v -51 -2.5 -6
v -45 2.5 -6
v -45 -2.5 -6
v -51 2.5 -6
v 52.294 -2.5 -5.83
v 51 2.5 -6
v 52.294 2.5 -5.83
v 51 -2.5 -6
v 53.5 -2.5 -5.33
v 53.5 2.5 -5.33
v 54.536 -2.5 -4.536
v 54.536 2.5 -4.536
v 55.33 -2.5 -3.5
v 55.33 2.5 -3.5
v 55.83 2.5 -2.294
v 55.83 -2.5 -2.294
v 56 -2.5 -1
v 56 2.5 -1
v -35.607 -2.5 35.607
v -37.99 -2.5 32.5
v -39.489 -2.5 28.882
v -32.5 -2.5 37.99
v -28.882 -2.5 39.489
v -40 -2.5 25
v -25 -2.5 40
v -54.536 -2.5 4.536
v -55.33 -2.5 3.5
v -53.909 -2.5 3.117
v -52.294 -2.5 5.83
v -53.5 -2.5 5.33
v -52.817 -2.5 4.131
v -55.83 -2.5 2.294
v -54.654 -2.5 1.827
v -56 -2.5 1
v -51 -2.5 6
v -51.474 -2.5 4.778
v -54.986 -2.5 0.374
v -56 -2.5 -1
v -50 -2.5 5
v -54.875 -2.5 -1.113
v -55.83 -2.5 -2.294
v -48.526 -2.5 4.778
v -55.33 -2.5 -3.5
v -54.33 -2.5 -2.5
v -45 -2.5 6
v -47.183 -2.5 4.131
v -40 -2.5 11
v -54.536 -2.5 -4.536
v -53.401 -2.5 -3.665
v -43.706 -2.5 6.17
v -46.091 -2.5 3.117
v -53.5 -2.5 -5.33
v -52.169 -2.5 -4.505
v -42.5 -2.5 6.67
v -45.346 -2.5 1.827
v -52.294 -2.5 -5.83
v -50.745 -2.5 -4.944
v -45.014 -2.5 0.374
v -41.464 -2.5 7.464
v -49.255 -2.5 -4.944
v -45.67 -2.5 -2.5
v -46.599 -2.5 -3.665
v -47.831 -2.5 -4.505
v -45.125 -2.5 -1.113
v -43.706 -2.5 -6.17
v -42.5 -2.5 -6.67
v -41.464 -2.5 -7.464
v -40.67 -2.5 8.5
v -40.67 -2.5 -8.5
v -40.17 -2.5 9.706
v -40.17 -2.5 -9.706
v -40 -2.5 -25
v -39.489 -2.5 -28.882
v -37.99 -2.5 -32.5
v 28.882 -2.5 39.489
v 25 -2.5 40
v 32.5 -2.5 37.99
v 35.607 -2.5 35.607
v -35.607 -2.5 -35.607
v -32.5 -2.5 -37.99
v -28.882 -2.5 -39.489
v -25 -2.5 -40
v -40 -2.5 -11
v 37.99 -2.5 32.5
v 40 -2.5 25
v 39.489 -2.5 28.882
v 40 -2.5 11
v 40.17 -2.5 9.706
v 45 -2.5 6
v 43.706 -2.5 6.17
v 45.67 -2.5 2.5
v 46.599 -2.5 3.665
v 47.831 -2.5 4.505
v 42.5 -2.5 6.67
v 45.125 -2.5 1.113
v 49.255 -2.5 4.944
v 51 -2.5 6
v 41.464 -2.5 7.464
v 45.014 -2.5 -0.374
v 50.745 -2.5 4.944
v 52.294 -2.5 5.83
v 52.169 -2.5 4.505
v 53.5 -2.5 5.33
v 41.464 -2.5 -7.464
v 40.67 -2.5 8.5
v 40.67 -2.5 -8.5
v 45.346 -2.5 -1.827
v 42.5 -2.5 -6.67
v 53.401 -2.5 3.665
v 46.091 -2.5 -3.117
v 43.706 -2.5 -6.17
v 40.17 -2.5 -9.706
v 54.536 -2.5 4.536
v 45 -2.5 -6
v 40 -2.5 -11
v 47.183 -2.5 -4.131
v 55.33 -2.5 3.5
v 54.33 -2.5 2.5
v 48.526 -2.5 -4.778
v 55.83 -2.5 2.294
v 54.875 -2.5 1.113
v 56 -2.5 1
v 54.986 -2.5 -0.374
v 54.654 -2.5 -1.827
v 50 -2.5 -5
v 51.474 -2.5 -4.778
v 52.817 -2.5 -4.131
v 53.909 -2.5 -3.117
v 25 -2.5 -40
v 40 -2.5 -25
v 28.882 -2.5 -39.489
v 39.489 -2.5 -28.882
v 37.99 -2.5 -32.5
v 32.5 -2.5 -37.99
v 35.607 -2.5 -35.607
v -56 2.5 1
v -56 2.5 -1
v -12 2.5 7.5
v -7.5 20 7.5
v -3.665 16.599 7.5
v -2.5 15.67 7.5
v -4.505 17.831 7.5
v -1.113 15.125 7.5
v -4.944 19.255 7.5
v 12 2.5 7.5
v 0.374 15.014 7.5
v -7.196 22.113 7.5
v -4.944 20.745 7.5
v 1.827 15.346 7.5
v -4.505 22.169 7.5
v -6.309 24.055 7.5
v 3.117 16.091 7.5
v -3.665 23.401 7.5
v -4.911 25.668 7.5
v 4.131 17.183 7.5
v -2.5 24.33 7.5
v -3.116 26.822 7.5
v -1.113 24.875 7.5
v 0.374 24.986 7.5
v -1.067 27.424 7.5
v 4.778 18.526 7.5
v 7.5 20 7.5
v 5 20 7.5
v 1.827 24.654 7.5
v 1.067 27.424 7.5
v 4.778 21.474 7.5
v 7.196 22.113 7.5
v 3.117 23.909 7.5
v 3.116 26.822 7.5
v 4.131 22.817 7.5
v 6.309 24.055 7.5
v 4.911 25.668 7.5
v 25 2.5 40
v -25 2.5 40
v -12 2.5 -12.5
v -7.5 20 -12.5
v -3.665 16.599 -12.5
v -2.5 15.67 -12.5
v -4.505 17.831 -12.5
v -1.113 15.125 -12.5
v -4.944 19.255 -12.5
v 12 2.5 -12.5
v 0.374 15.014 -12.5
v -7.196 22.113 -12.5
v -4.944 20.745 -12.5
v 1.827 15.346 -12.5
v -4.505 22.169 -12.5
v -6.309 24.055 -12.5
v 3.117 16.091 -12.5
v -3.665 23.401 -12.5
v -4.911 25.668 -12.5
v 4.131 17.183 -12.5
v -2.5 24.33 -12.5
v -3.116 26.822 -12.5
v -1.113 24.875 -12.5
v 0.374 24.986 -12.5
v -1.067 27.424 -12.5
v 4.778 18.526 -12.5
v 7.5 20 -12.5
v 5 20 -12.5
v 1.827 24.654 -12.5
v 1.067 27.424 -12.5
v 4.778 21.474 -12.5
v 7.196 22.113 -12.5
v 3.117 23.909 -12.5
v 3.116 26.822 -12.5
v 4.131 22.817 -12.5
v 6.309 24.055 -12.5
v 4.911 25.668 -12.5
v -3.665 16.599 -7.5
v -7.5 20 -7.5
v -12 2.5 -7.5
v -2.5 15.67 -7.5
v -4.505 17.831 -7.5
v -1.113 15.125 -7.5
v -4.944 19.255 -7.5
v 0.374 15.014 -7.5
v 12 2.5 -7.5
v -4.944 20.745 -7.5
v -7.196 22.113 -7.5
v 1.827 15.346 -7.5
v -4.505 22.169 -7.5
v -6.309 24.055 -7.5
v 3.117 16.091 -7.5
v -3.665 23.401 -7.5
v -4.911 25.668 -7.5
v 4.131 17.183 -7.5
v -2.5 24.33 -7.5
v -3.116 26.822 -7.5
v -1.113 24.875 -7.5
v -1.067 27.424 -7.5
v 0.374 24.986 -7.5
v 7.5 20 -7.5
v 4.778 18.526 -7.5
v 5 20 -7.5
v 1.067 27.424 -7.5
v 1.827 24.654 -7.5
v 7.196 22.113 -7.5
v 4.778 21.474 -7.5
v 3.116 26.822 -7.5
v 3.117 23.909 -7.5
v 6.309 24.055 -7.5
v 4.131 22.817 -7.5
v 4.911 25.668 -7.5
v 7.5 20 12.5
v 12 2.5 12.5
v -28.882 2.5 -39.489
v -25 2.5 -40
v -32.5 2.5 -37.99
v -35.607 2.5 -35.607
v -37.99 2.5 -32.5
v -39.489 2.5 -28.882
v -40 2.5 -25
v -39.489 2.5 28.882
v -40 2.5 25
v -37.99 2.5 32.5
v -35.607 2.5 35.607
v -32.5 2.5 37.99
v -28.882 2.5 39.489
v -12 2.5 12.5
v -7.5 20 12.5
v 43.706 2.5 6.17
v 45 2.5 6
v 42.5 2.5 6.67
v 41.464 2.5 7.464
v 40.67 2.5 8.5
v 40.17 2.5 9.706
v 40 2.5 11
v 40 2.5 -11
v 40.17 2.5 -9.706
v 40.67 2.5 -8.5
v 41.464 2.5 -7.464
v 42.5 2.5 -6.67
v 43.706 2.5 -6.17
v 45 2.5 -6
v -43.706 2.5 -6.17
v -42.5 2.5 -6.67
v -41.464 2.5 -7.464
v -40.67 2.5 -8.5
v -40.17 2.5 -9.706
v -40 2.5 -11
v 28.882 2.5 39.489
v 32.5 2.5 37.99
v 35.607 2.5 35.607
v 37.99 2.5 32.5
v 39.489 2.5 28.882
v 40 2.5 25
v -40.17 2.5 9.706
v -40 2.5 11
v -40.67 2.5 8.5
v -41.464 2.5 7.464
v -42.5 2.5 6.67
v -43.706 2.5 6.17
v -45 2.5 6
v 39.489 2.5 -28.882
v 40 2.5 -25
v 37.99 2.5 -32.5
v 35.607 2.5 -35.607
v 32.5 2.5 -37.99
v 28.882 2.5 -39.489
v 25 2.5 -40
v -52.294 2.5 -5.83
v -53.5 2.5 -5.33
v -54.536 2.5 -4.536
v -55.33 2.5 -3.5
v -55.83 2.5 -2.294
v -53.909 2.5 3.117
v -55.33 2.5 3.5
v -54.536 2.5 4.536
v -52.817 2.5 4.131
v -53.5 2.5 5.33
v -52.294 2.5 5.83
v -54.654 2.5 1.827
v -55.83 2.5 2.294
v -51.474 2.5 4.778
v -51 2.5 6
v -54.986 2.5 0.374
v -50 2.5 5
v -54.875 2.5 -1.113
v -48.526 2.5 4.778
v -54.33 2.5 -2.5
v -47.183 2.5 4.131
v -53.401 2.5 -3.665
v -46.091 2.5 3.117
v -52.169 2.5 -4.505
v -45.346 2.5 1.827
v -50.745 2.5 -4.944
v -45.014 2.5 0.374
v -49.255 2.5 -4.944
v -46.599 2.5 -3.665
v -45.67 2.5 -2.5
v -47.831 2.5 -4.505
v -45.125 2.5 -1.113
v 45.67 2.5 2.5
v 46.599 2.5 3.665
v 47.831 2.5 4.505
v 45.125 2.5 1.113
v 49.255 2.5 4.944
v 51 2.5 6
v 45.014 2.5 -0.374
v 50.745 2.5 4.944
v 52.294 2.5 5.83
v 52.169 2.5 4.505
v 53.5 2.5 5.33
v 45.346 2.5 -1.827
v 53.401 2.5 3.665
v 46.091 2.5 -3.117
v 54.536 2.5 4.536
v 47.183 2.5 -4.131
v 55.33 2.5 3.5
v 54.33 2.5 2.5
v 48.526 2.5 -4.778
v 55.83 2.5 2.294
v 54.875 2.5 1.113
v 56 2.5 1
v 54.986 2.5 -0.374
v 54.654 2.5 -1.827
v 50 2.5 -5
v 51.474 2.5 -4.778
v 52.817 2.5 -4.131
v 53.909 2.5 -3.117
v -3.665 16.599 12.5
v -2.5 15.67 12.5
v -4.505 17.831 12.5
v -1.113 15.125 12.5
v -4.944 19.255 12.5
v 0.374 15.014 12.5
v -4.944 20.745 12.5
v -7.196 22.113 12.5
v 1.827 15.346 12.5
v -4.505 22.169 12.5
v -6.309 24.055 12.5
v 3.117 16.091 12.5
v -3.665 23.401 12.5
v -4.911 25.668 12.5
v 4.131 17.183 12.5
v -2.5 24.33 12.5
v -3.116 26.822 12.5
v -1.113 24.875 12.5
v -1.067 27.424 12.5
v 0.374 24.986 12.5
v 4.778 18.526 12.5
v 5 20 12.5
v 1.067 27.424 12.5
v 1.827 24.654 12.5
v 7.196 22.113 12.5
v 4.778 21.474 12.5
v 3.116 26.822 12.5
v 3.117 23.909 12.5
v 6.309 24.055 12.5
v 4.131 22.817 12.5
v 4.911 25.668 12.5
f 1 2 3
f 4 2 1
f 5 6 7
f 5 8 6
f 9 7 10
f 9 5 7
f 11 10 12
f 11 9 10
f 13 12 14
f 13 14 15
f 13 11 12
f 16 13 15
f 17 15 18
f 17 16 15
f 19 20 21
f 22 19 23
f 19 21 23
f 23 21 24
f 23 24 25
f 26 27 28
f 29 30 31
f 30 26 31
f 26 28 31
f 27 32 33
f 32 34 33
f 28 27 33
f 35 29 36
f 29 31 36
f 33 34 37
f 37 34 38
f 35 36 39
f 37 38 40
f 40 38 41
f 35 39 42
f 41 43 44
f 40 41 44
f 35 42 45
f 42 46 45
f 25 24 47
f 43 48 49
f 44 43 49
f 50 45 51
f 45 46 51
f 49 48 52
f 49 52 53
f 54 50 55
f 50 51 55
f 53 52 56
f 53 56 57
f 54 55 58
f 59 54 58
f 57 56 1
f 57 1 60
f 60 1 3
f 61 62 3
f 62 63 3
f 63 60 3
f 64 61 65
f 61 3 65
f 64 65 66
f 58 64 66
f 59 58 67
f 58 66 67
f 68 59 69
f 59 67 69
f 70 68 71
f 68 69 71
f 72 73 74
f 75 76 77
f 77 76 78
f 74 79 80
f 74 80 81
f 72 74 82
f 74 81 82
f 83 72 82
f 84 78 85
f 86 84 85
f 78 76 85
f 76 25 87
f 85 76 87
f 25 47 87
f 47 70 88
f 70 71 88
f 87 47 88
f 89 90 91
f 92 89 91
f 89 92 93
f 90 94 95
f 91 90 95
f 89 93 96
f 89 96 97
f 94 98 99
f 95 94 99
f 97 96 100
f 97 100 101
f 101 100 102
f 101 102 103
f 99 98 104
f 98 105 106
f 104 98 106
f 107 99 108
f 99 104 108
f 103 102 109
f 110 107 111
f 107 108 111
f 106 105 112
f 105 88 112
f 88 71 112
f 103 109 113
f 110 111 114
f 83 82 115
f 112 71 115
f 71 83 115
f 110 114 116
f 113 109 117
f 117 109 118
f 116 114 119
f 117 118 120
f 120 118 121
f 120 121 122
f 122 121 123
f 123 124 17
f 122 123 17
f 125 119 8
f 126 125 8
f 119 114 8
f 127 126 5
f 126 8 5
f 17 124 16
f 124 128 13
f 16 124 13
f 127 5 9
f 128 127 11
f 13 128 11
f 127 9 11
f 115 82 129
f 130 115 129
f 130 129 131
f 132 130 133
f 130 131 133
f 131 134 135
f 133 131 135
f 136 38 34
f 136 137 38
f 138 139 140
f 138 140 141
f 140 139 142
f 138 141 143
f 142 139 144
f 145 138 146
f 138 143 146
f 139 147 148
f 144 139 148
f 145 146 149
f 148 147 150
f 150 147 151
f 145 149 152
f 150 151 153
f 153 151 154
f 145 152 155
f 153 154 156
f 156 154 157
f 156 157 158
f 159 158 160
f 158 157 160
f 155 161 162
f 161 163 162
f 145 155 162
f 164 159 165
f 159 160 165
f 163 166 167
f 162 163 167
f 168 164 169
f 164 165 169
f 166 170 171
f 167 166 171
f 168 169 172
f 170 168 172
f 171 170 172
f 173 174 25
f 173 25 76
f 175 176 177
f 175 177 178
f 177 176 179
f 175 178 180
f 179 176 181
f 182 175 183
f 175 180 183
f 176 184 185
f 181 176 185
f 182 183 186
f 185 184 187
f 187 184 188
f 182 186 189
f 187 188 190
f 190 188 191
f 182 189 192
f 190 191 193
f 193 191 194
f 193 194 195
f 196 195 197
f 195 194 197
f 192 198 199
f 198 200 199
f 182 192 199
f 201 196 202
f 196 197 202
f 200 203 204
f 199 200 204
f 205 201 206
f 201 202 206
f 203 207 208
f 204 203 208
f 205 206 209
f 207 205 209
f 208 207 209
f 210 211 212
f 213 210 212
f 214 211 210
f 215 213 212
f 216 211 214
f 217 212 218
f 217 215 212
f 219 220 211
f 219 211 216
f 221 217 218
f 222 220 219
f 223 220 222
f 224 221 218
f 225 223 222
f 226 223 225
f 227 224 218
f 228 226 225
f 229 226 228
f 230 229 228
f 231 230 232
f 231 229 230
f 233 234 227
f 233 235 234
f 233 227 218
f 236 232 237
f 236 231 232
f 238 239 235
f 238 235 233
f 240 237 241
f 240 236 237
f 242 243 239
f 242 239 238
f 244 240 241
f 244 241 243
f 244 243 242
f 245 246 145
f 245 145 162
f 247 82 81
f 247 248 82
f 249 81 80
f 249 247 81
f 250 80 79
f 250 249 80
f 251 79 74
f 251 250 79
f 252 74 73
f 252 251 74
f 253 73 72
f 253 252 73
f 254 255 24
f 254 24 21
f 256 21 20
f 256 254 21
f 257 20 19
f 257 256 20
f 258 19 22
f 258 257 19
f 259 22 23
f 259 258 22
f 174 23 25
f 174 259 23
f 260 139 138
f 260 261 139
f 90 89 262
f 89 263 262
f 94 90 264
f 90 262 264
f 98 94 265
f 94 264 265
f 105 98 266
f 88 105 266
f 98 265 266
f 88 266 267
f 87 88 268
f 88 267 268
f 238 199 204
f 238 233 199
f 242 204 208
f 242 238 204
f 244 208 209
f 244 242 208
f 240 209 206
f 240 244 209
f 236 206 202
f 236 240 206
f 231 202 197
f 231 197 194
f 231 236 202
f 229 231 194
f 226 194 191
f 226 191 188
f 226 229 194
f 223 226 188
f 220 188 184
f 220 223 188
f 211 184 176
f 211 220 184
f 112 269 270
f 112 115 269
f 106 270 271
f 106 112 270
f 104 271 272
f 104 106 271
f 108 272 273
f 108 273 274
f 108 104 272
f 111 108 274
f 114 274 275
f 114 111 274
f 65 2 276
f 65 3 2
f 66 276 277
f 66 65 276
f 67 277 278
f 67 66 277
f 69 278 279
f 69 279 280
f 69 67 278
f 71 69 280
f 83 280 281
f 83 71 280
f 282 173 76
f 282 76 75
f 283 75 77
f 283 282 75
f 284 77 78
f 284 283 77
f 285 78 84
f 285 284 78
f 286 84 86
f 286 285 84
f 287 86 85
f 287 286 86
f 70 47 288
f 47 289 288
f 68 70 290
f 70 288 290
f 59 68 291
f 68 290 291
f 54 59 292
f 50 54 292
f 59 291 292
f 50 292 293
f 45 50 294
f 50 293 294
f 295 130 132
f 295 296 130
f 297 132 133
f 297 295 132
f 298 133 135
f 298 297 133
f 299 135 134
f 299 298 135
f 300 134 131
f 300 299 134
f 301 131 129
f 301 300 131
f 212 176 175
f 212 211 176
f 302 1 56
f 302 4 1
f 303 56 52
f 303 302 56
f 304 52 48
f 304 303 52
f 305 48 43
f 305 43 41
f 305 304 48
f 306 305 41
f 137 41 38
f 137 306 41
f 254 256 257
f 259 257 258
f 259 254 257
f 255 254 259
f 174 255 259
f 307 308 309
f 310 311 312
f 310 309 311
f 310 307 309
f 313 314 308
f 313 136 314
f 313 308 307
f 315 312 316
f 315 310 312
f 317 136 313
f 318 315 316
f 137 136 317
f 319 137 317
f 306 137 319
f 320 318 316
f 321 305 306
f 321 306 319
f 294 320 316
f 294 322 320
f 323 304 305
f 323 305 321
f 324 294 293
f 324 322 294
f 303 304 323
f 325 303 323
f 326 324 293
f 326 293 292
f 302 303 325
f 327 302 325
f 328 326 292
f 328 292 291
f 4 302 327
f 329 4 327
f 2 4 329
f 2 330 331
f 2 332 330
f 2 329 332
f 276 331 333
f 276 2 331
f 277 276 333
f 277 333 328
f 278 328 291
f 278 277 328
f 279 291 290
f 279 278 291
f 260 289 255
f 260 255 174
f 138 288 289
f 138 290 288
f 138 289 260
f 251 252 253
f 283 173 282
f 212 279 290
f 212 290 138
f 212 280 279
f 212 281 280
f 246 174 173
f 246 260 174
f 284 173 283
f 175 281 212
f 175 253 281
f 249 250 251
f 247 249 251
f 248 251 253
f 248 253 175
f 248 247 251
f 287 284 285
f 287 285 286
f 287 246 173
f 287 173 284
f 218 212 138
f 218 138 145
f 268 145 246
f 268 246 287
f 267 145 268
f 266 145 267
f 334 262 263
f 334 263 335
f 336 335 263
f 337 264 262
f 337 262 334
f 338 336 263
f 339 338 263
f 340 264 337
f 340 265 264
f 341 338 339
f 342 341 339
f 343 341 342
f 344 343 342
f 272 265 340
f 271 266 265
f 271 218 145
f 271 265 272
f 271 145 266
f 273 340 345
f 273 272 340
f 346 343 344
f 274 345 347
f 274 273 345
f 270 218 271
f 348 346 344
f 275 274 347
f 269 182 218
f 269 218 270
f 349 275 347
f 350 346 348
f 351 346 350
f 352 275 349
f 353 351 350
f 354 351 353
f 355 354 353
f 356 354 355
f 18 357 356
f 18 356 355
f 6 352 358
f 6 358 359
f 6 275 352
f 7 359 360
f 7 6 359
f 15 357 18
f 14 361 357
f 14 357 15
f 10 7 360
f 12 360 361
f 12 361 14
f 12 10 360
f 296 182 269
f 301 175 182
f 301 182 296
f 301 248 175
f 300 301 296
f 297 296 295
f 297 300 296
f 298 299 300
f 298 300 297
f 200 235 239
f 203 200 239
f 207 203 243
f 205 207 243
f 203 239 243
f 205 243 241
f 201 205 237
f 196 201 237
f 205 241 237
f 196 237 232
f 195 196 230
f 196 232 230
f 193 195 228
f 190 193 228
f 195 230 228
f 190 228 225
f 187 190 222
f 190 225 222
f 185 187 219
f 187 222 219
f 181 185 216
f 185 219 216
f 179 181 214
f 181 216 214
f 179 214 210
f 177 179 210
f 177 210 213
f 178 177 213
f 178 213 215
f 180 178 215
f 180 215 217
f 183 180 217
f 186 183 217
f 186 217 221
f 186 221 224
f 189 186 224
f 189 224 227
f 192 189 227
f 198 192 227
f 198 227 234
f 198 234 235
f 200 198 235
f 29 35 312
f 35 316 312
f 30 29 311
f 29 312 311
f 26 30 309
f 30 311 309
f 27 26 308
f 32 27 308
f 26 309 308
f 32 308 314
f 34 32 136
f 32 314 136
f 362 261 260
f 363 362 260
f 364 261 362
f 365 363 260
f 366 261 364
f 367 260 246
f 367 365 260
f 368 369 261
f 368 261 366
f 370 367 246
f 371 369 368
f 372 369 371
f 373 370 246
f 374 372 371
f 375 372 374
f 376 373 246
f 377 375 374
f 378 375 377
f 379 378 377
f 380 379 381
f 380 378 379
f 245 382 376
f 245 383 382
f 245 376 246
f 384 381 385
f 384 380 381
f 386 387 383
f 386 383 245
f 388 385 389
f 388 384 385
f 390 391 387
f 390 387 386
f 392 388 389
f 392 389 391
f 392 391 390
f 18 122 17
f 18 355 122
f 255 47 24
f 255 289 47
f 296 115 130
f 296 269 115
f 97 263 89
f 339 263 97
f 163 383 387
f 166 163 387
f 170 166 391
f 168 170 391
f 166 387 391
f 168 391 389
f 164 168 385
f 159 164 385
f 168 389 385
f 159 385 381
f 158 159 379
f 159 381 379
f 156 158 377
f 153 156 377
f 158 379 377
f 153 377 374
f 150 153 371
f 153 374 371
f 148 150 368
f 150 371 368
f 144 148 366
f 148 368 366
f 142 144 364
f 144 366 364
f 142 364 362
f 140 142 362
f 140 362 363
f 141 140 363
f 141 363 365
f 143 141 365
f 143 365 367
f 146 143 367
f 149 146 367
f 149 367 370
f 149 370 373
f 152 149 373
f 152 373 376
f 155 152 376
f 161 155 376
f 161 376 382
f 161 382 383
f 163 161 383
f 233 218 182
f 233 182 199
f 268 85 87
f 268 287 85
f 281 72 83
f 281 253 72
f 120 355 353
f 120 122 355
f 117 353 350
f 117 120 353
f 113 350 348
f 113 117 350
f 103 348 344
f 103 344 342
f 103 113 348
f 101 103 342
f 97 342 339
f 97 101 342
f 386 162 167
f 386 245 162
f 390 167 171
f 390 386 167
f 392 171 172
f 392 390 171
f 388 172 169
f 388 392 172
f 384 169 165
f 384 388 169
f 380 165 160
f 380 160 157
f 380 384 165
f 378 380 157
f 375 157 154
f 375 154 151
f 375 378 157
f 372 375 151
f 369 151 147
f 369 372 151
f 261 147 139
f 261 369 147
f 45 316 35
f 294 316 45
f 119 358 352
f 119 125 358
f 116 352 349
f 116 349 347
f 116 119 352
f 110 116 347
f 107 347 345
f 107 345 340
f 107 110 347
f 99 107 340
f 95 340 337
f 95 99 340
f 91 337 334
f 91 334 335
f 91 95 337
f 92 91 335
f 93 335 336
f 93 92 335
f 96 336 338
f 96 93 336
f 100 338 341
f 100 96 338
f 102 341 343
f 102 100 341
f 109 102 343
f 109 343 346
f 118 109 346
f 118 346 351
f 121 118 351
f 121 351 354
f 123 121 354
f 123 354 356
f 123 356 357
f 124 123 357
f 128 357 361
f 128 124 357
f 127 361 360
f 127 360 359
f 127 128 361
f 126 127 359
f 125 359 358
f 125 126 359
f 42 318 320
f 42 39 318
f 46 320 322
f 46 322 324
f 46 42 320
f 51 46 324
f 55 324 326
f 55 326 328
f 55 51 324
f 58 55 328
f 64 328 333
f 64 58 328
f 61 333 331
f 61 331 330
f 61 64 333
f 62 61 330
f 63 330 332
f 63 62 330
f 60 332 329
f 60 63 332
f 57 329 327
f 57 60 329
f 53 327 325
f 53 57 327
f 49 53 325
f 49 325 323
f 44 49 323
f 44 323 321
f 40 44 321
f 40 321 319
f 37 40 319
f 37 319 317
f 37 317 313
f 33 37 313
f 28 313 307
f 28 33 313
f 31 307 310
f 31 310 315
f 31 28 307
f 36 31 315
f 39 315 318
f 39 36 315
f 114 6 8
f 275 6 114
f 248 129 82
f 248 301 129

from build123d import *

# Parameters (mm, degrees)
SKETCH1_R           = 5
BOSS_EXTRUDE1_DEPTH = 2.5
FILLET1_R           = 5
BOSS_EXTRUDE2_START = 10
BOSS_EXTRUDE2_DEPTH = 2.5
BOSS_EXTRUDE3_START = -10
BOSS_EXTRUDE3_DEPTH = 2.5
SKETCH3_R           = 5
CUT_EXTRUDE1_DEPTH  = 85


with BuildPart() as part:
    # Sketch1 → Boss-Extrude1 (new, symmetric)
    with BuildSketch(Plane(origin=(0, 0, 0), x_dir=(1, 0, 0), z_dir=(0, 1, 0))):
        with BuildLine():
            Line((-40, 6), (-56, 6))
            Line((-56, 6), (-56, -6))
            Line((-56, -6), (-40, -6))
            Line((-40, -6), (-40, -25))
            ThreePointArc((-40, -25), (-35.606601718, -35.606601718), (-25, -40))
            Line((-25, -40), (25, -40))
            ThreePointArc((25, -40), (35.606601718, -35.606601718), (40, -25))
            Line((40, -25), (40, -6))
            Line((40, -6), (56, -6))
            Line((56, -6), (56, 6))
            Line((56, 6), (40, 6))
            Line((40, 6), (40, 25))
            ThreePointArc((40, 25), (35.606601718, 35.606601718), (25, 40))
            Line((25, 40), (-25, 40))
            ThreePointArc((-25, 40), (-35.606601718, 35.606601718), (-40, 25))
            Line((-40, 25), (-40, 6))
        make_face()
        with Locations((-50, 0)):
            Circle(SKETCH1_R, mode=Mode.SUBTRACT)
        with Locations((50, 0)):
            Circle(SKETCH1_R, mode=Mode.SUBTRACT)
    extrude(amount=BOSS_EXTRUDE1_DEPTH, both=True)

    # Fillet1
    fillet1_edges = [part.edges().sort_by_distance(p)[0] for p in [
        (-40, 0, -6),
        (-56, 0, -6),
        (-56, 0, 6),
        (-40, 0, 6),
        (40, 0, -6),
        (56, 0, -6),
        (56, 0, 6),
        (40, 0, 6),
    ]]
    fillet(fillet1_edges, radius=FILLET1_R)

    # Sketch2 → Boss-Extrude2 (add, symmetric)
    with BuildSketch(Plane.XY.offset(BOSS_EXTRUDE2_START)):
        with BuildLine():
            Line((-7.5, 20), (-12, 2.5))
            Line((-12, 2.5), (12, 2.5))
            Line((12, 2.5), (7.5, 20))
            ThreePointArc((7.5, 20), (0, 27.5), (-7.5, 20))
        make_face()
    extrude(amount=BOSS_EXTRUDE2_DEPTH, both=True)

    # Sketch2<2> → Boss-Extrude3 (add, symmetric)
    with BuildSketch(Plane.XY.offset(BOSS_EXTRUDE3_START)):
        with BuildLine():
            Line((-7.5, 20), (-12, 2.5))
            Line((-12, 2.5), (12, 2.5))
            Line((12, 2.5), (7.5, 20))
            ThreePointArc((7.5, 20), (0, 27.5), (-7.5, 20))
        make_face()
    extrude(amount=BOSS_EXTRUDE3_DEPTH, both=True)

    # Sketch3 → Cut-Extrude1 (cut)
    with BuildSketch(Plane.XY.offset(12.5)):
        with Locations((0, 20)):
            Circle(SKETCH3_R)
    extrude(amount=-CUT_EXTRUDE1_DEPTH, mode=Mode.SUBTRACT)


solid = part.part
